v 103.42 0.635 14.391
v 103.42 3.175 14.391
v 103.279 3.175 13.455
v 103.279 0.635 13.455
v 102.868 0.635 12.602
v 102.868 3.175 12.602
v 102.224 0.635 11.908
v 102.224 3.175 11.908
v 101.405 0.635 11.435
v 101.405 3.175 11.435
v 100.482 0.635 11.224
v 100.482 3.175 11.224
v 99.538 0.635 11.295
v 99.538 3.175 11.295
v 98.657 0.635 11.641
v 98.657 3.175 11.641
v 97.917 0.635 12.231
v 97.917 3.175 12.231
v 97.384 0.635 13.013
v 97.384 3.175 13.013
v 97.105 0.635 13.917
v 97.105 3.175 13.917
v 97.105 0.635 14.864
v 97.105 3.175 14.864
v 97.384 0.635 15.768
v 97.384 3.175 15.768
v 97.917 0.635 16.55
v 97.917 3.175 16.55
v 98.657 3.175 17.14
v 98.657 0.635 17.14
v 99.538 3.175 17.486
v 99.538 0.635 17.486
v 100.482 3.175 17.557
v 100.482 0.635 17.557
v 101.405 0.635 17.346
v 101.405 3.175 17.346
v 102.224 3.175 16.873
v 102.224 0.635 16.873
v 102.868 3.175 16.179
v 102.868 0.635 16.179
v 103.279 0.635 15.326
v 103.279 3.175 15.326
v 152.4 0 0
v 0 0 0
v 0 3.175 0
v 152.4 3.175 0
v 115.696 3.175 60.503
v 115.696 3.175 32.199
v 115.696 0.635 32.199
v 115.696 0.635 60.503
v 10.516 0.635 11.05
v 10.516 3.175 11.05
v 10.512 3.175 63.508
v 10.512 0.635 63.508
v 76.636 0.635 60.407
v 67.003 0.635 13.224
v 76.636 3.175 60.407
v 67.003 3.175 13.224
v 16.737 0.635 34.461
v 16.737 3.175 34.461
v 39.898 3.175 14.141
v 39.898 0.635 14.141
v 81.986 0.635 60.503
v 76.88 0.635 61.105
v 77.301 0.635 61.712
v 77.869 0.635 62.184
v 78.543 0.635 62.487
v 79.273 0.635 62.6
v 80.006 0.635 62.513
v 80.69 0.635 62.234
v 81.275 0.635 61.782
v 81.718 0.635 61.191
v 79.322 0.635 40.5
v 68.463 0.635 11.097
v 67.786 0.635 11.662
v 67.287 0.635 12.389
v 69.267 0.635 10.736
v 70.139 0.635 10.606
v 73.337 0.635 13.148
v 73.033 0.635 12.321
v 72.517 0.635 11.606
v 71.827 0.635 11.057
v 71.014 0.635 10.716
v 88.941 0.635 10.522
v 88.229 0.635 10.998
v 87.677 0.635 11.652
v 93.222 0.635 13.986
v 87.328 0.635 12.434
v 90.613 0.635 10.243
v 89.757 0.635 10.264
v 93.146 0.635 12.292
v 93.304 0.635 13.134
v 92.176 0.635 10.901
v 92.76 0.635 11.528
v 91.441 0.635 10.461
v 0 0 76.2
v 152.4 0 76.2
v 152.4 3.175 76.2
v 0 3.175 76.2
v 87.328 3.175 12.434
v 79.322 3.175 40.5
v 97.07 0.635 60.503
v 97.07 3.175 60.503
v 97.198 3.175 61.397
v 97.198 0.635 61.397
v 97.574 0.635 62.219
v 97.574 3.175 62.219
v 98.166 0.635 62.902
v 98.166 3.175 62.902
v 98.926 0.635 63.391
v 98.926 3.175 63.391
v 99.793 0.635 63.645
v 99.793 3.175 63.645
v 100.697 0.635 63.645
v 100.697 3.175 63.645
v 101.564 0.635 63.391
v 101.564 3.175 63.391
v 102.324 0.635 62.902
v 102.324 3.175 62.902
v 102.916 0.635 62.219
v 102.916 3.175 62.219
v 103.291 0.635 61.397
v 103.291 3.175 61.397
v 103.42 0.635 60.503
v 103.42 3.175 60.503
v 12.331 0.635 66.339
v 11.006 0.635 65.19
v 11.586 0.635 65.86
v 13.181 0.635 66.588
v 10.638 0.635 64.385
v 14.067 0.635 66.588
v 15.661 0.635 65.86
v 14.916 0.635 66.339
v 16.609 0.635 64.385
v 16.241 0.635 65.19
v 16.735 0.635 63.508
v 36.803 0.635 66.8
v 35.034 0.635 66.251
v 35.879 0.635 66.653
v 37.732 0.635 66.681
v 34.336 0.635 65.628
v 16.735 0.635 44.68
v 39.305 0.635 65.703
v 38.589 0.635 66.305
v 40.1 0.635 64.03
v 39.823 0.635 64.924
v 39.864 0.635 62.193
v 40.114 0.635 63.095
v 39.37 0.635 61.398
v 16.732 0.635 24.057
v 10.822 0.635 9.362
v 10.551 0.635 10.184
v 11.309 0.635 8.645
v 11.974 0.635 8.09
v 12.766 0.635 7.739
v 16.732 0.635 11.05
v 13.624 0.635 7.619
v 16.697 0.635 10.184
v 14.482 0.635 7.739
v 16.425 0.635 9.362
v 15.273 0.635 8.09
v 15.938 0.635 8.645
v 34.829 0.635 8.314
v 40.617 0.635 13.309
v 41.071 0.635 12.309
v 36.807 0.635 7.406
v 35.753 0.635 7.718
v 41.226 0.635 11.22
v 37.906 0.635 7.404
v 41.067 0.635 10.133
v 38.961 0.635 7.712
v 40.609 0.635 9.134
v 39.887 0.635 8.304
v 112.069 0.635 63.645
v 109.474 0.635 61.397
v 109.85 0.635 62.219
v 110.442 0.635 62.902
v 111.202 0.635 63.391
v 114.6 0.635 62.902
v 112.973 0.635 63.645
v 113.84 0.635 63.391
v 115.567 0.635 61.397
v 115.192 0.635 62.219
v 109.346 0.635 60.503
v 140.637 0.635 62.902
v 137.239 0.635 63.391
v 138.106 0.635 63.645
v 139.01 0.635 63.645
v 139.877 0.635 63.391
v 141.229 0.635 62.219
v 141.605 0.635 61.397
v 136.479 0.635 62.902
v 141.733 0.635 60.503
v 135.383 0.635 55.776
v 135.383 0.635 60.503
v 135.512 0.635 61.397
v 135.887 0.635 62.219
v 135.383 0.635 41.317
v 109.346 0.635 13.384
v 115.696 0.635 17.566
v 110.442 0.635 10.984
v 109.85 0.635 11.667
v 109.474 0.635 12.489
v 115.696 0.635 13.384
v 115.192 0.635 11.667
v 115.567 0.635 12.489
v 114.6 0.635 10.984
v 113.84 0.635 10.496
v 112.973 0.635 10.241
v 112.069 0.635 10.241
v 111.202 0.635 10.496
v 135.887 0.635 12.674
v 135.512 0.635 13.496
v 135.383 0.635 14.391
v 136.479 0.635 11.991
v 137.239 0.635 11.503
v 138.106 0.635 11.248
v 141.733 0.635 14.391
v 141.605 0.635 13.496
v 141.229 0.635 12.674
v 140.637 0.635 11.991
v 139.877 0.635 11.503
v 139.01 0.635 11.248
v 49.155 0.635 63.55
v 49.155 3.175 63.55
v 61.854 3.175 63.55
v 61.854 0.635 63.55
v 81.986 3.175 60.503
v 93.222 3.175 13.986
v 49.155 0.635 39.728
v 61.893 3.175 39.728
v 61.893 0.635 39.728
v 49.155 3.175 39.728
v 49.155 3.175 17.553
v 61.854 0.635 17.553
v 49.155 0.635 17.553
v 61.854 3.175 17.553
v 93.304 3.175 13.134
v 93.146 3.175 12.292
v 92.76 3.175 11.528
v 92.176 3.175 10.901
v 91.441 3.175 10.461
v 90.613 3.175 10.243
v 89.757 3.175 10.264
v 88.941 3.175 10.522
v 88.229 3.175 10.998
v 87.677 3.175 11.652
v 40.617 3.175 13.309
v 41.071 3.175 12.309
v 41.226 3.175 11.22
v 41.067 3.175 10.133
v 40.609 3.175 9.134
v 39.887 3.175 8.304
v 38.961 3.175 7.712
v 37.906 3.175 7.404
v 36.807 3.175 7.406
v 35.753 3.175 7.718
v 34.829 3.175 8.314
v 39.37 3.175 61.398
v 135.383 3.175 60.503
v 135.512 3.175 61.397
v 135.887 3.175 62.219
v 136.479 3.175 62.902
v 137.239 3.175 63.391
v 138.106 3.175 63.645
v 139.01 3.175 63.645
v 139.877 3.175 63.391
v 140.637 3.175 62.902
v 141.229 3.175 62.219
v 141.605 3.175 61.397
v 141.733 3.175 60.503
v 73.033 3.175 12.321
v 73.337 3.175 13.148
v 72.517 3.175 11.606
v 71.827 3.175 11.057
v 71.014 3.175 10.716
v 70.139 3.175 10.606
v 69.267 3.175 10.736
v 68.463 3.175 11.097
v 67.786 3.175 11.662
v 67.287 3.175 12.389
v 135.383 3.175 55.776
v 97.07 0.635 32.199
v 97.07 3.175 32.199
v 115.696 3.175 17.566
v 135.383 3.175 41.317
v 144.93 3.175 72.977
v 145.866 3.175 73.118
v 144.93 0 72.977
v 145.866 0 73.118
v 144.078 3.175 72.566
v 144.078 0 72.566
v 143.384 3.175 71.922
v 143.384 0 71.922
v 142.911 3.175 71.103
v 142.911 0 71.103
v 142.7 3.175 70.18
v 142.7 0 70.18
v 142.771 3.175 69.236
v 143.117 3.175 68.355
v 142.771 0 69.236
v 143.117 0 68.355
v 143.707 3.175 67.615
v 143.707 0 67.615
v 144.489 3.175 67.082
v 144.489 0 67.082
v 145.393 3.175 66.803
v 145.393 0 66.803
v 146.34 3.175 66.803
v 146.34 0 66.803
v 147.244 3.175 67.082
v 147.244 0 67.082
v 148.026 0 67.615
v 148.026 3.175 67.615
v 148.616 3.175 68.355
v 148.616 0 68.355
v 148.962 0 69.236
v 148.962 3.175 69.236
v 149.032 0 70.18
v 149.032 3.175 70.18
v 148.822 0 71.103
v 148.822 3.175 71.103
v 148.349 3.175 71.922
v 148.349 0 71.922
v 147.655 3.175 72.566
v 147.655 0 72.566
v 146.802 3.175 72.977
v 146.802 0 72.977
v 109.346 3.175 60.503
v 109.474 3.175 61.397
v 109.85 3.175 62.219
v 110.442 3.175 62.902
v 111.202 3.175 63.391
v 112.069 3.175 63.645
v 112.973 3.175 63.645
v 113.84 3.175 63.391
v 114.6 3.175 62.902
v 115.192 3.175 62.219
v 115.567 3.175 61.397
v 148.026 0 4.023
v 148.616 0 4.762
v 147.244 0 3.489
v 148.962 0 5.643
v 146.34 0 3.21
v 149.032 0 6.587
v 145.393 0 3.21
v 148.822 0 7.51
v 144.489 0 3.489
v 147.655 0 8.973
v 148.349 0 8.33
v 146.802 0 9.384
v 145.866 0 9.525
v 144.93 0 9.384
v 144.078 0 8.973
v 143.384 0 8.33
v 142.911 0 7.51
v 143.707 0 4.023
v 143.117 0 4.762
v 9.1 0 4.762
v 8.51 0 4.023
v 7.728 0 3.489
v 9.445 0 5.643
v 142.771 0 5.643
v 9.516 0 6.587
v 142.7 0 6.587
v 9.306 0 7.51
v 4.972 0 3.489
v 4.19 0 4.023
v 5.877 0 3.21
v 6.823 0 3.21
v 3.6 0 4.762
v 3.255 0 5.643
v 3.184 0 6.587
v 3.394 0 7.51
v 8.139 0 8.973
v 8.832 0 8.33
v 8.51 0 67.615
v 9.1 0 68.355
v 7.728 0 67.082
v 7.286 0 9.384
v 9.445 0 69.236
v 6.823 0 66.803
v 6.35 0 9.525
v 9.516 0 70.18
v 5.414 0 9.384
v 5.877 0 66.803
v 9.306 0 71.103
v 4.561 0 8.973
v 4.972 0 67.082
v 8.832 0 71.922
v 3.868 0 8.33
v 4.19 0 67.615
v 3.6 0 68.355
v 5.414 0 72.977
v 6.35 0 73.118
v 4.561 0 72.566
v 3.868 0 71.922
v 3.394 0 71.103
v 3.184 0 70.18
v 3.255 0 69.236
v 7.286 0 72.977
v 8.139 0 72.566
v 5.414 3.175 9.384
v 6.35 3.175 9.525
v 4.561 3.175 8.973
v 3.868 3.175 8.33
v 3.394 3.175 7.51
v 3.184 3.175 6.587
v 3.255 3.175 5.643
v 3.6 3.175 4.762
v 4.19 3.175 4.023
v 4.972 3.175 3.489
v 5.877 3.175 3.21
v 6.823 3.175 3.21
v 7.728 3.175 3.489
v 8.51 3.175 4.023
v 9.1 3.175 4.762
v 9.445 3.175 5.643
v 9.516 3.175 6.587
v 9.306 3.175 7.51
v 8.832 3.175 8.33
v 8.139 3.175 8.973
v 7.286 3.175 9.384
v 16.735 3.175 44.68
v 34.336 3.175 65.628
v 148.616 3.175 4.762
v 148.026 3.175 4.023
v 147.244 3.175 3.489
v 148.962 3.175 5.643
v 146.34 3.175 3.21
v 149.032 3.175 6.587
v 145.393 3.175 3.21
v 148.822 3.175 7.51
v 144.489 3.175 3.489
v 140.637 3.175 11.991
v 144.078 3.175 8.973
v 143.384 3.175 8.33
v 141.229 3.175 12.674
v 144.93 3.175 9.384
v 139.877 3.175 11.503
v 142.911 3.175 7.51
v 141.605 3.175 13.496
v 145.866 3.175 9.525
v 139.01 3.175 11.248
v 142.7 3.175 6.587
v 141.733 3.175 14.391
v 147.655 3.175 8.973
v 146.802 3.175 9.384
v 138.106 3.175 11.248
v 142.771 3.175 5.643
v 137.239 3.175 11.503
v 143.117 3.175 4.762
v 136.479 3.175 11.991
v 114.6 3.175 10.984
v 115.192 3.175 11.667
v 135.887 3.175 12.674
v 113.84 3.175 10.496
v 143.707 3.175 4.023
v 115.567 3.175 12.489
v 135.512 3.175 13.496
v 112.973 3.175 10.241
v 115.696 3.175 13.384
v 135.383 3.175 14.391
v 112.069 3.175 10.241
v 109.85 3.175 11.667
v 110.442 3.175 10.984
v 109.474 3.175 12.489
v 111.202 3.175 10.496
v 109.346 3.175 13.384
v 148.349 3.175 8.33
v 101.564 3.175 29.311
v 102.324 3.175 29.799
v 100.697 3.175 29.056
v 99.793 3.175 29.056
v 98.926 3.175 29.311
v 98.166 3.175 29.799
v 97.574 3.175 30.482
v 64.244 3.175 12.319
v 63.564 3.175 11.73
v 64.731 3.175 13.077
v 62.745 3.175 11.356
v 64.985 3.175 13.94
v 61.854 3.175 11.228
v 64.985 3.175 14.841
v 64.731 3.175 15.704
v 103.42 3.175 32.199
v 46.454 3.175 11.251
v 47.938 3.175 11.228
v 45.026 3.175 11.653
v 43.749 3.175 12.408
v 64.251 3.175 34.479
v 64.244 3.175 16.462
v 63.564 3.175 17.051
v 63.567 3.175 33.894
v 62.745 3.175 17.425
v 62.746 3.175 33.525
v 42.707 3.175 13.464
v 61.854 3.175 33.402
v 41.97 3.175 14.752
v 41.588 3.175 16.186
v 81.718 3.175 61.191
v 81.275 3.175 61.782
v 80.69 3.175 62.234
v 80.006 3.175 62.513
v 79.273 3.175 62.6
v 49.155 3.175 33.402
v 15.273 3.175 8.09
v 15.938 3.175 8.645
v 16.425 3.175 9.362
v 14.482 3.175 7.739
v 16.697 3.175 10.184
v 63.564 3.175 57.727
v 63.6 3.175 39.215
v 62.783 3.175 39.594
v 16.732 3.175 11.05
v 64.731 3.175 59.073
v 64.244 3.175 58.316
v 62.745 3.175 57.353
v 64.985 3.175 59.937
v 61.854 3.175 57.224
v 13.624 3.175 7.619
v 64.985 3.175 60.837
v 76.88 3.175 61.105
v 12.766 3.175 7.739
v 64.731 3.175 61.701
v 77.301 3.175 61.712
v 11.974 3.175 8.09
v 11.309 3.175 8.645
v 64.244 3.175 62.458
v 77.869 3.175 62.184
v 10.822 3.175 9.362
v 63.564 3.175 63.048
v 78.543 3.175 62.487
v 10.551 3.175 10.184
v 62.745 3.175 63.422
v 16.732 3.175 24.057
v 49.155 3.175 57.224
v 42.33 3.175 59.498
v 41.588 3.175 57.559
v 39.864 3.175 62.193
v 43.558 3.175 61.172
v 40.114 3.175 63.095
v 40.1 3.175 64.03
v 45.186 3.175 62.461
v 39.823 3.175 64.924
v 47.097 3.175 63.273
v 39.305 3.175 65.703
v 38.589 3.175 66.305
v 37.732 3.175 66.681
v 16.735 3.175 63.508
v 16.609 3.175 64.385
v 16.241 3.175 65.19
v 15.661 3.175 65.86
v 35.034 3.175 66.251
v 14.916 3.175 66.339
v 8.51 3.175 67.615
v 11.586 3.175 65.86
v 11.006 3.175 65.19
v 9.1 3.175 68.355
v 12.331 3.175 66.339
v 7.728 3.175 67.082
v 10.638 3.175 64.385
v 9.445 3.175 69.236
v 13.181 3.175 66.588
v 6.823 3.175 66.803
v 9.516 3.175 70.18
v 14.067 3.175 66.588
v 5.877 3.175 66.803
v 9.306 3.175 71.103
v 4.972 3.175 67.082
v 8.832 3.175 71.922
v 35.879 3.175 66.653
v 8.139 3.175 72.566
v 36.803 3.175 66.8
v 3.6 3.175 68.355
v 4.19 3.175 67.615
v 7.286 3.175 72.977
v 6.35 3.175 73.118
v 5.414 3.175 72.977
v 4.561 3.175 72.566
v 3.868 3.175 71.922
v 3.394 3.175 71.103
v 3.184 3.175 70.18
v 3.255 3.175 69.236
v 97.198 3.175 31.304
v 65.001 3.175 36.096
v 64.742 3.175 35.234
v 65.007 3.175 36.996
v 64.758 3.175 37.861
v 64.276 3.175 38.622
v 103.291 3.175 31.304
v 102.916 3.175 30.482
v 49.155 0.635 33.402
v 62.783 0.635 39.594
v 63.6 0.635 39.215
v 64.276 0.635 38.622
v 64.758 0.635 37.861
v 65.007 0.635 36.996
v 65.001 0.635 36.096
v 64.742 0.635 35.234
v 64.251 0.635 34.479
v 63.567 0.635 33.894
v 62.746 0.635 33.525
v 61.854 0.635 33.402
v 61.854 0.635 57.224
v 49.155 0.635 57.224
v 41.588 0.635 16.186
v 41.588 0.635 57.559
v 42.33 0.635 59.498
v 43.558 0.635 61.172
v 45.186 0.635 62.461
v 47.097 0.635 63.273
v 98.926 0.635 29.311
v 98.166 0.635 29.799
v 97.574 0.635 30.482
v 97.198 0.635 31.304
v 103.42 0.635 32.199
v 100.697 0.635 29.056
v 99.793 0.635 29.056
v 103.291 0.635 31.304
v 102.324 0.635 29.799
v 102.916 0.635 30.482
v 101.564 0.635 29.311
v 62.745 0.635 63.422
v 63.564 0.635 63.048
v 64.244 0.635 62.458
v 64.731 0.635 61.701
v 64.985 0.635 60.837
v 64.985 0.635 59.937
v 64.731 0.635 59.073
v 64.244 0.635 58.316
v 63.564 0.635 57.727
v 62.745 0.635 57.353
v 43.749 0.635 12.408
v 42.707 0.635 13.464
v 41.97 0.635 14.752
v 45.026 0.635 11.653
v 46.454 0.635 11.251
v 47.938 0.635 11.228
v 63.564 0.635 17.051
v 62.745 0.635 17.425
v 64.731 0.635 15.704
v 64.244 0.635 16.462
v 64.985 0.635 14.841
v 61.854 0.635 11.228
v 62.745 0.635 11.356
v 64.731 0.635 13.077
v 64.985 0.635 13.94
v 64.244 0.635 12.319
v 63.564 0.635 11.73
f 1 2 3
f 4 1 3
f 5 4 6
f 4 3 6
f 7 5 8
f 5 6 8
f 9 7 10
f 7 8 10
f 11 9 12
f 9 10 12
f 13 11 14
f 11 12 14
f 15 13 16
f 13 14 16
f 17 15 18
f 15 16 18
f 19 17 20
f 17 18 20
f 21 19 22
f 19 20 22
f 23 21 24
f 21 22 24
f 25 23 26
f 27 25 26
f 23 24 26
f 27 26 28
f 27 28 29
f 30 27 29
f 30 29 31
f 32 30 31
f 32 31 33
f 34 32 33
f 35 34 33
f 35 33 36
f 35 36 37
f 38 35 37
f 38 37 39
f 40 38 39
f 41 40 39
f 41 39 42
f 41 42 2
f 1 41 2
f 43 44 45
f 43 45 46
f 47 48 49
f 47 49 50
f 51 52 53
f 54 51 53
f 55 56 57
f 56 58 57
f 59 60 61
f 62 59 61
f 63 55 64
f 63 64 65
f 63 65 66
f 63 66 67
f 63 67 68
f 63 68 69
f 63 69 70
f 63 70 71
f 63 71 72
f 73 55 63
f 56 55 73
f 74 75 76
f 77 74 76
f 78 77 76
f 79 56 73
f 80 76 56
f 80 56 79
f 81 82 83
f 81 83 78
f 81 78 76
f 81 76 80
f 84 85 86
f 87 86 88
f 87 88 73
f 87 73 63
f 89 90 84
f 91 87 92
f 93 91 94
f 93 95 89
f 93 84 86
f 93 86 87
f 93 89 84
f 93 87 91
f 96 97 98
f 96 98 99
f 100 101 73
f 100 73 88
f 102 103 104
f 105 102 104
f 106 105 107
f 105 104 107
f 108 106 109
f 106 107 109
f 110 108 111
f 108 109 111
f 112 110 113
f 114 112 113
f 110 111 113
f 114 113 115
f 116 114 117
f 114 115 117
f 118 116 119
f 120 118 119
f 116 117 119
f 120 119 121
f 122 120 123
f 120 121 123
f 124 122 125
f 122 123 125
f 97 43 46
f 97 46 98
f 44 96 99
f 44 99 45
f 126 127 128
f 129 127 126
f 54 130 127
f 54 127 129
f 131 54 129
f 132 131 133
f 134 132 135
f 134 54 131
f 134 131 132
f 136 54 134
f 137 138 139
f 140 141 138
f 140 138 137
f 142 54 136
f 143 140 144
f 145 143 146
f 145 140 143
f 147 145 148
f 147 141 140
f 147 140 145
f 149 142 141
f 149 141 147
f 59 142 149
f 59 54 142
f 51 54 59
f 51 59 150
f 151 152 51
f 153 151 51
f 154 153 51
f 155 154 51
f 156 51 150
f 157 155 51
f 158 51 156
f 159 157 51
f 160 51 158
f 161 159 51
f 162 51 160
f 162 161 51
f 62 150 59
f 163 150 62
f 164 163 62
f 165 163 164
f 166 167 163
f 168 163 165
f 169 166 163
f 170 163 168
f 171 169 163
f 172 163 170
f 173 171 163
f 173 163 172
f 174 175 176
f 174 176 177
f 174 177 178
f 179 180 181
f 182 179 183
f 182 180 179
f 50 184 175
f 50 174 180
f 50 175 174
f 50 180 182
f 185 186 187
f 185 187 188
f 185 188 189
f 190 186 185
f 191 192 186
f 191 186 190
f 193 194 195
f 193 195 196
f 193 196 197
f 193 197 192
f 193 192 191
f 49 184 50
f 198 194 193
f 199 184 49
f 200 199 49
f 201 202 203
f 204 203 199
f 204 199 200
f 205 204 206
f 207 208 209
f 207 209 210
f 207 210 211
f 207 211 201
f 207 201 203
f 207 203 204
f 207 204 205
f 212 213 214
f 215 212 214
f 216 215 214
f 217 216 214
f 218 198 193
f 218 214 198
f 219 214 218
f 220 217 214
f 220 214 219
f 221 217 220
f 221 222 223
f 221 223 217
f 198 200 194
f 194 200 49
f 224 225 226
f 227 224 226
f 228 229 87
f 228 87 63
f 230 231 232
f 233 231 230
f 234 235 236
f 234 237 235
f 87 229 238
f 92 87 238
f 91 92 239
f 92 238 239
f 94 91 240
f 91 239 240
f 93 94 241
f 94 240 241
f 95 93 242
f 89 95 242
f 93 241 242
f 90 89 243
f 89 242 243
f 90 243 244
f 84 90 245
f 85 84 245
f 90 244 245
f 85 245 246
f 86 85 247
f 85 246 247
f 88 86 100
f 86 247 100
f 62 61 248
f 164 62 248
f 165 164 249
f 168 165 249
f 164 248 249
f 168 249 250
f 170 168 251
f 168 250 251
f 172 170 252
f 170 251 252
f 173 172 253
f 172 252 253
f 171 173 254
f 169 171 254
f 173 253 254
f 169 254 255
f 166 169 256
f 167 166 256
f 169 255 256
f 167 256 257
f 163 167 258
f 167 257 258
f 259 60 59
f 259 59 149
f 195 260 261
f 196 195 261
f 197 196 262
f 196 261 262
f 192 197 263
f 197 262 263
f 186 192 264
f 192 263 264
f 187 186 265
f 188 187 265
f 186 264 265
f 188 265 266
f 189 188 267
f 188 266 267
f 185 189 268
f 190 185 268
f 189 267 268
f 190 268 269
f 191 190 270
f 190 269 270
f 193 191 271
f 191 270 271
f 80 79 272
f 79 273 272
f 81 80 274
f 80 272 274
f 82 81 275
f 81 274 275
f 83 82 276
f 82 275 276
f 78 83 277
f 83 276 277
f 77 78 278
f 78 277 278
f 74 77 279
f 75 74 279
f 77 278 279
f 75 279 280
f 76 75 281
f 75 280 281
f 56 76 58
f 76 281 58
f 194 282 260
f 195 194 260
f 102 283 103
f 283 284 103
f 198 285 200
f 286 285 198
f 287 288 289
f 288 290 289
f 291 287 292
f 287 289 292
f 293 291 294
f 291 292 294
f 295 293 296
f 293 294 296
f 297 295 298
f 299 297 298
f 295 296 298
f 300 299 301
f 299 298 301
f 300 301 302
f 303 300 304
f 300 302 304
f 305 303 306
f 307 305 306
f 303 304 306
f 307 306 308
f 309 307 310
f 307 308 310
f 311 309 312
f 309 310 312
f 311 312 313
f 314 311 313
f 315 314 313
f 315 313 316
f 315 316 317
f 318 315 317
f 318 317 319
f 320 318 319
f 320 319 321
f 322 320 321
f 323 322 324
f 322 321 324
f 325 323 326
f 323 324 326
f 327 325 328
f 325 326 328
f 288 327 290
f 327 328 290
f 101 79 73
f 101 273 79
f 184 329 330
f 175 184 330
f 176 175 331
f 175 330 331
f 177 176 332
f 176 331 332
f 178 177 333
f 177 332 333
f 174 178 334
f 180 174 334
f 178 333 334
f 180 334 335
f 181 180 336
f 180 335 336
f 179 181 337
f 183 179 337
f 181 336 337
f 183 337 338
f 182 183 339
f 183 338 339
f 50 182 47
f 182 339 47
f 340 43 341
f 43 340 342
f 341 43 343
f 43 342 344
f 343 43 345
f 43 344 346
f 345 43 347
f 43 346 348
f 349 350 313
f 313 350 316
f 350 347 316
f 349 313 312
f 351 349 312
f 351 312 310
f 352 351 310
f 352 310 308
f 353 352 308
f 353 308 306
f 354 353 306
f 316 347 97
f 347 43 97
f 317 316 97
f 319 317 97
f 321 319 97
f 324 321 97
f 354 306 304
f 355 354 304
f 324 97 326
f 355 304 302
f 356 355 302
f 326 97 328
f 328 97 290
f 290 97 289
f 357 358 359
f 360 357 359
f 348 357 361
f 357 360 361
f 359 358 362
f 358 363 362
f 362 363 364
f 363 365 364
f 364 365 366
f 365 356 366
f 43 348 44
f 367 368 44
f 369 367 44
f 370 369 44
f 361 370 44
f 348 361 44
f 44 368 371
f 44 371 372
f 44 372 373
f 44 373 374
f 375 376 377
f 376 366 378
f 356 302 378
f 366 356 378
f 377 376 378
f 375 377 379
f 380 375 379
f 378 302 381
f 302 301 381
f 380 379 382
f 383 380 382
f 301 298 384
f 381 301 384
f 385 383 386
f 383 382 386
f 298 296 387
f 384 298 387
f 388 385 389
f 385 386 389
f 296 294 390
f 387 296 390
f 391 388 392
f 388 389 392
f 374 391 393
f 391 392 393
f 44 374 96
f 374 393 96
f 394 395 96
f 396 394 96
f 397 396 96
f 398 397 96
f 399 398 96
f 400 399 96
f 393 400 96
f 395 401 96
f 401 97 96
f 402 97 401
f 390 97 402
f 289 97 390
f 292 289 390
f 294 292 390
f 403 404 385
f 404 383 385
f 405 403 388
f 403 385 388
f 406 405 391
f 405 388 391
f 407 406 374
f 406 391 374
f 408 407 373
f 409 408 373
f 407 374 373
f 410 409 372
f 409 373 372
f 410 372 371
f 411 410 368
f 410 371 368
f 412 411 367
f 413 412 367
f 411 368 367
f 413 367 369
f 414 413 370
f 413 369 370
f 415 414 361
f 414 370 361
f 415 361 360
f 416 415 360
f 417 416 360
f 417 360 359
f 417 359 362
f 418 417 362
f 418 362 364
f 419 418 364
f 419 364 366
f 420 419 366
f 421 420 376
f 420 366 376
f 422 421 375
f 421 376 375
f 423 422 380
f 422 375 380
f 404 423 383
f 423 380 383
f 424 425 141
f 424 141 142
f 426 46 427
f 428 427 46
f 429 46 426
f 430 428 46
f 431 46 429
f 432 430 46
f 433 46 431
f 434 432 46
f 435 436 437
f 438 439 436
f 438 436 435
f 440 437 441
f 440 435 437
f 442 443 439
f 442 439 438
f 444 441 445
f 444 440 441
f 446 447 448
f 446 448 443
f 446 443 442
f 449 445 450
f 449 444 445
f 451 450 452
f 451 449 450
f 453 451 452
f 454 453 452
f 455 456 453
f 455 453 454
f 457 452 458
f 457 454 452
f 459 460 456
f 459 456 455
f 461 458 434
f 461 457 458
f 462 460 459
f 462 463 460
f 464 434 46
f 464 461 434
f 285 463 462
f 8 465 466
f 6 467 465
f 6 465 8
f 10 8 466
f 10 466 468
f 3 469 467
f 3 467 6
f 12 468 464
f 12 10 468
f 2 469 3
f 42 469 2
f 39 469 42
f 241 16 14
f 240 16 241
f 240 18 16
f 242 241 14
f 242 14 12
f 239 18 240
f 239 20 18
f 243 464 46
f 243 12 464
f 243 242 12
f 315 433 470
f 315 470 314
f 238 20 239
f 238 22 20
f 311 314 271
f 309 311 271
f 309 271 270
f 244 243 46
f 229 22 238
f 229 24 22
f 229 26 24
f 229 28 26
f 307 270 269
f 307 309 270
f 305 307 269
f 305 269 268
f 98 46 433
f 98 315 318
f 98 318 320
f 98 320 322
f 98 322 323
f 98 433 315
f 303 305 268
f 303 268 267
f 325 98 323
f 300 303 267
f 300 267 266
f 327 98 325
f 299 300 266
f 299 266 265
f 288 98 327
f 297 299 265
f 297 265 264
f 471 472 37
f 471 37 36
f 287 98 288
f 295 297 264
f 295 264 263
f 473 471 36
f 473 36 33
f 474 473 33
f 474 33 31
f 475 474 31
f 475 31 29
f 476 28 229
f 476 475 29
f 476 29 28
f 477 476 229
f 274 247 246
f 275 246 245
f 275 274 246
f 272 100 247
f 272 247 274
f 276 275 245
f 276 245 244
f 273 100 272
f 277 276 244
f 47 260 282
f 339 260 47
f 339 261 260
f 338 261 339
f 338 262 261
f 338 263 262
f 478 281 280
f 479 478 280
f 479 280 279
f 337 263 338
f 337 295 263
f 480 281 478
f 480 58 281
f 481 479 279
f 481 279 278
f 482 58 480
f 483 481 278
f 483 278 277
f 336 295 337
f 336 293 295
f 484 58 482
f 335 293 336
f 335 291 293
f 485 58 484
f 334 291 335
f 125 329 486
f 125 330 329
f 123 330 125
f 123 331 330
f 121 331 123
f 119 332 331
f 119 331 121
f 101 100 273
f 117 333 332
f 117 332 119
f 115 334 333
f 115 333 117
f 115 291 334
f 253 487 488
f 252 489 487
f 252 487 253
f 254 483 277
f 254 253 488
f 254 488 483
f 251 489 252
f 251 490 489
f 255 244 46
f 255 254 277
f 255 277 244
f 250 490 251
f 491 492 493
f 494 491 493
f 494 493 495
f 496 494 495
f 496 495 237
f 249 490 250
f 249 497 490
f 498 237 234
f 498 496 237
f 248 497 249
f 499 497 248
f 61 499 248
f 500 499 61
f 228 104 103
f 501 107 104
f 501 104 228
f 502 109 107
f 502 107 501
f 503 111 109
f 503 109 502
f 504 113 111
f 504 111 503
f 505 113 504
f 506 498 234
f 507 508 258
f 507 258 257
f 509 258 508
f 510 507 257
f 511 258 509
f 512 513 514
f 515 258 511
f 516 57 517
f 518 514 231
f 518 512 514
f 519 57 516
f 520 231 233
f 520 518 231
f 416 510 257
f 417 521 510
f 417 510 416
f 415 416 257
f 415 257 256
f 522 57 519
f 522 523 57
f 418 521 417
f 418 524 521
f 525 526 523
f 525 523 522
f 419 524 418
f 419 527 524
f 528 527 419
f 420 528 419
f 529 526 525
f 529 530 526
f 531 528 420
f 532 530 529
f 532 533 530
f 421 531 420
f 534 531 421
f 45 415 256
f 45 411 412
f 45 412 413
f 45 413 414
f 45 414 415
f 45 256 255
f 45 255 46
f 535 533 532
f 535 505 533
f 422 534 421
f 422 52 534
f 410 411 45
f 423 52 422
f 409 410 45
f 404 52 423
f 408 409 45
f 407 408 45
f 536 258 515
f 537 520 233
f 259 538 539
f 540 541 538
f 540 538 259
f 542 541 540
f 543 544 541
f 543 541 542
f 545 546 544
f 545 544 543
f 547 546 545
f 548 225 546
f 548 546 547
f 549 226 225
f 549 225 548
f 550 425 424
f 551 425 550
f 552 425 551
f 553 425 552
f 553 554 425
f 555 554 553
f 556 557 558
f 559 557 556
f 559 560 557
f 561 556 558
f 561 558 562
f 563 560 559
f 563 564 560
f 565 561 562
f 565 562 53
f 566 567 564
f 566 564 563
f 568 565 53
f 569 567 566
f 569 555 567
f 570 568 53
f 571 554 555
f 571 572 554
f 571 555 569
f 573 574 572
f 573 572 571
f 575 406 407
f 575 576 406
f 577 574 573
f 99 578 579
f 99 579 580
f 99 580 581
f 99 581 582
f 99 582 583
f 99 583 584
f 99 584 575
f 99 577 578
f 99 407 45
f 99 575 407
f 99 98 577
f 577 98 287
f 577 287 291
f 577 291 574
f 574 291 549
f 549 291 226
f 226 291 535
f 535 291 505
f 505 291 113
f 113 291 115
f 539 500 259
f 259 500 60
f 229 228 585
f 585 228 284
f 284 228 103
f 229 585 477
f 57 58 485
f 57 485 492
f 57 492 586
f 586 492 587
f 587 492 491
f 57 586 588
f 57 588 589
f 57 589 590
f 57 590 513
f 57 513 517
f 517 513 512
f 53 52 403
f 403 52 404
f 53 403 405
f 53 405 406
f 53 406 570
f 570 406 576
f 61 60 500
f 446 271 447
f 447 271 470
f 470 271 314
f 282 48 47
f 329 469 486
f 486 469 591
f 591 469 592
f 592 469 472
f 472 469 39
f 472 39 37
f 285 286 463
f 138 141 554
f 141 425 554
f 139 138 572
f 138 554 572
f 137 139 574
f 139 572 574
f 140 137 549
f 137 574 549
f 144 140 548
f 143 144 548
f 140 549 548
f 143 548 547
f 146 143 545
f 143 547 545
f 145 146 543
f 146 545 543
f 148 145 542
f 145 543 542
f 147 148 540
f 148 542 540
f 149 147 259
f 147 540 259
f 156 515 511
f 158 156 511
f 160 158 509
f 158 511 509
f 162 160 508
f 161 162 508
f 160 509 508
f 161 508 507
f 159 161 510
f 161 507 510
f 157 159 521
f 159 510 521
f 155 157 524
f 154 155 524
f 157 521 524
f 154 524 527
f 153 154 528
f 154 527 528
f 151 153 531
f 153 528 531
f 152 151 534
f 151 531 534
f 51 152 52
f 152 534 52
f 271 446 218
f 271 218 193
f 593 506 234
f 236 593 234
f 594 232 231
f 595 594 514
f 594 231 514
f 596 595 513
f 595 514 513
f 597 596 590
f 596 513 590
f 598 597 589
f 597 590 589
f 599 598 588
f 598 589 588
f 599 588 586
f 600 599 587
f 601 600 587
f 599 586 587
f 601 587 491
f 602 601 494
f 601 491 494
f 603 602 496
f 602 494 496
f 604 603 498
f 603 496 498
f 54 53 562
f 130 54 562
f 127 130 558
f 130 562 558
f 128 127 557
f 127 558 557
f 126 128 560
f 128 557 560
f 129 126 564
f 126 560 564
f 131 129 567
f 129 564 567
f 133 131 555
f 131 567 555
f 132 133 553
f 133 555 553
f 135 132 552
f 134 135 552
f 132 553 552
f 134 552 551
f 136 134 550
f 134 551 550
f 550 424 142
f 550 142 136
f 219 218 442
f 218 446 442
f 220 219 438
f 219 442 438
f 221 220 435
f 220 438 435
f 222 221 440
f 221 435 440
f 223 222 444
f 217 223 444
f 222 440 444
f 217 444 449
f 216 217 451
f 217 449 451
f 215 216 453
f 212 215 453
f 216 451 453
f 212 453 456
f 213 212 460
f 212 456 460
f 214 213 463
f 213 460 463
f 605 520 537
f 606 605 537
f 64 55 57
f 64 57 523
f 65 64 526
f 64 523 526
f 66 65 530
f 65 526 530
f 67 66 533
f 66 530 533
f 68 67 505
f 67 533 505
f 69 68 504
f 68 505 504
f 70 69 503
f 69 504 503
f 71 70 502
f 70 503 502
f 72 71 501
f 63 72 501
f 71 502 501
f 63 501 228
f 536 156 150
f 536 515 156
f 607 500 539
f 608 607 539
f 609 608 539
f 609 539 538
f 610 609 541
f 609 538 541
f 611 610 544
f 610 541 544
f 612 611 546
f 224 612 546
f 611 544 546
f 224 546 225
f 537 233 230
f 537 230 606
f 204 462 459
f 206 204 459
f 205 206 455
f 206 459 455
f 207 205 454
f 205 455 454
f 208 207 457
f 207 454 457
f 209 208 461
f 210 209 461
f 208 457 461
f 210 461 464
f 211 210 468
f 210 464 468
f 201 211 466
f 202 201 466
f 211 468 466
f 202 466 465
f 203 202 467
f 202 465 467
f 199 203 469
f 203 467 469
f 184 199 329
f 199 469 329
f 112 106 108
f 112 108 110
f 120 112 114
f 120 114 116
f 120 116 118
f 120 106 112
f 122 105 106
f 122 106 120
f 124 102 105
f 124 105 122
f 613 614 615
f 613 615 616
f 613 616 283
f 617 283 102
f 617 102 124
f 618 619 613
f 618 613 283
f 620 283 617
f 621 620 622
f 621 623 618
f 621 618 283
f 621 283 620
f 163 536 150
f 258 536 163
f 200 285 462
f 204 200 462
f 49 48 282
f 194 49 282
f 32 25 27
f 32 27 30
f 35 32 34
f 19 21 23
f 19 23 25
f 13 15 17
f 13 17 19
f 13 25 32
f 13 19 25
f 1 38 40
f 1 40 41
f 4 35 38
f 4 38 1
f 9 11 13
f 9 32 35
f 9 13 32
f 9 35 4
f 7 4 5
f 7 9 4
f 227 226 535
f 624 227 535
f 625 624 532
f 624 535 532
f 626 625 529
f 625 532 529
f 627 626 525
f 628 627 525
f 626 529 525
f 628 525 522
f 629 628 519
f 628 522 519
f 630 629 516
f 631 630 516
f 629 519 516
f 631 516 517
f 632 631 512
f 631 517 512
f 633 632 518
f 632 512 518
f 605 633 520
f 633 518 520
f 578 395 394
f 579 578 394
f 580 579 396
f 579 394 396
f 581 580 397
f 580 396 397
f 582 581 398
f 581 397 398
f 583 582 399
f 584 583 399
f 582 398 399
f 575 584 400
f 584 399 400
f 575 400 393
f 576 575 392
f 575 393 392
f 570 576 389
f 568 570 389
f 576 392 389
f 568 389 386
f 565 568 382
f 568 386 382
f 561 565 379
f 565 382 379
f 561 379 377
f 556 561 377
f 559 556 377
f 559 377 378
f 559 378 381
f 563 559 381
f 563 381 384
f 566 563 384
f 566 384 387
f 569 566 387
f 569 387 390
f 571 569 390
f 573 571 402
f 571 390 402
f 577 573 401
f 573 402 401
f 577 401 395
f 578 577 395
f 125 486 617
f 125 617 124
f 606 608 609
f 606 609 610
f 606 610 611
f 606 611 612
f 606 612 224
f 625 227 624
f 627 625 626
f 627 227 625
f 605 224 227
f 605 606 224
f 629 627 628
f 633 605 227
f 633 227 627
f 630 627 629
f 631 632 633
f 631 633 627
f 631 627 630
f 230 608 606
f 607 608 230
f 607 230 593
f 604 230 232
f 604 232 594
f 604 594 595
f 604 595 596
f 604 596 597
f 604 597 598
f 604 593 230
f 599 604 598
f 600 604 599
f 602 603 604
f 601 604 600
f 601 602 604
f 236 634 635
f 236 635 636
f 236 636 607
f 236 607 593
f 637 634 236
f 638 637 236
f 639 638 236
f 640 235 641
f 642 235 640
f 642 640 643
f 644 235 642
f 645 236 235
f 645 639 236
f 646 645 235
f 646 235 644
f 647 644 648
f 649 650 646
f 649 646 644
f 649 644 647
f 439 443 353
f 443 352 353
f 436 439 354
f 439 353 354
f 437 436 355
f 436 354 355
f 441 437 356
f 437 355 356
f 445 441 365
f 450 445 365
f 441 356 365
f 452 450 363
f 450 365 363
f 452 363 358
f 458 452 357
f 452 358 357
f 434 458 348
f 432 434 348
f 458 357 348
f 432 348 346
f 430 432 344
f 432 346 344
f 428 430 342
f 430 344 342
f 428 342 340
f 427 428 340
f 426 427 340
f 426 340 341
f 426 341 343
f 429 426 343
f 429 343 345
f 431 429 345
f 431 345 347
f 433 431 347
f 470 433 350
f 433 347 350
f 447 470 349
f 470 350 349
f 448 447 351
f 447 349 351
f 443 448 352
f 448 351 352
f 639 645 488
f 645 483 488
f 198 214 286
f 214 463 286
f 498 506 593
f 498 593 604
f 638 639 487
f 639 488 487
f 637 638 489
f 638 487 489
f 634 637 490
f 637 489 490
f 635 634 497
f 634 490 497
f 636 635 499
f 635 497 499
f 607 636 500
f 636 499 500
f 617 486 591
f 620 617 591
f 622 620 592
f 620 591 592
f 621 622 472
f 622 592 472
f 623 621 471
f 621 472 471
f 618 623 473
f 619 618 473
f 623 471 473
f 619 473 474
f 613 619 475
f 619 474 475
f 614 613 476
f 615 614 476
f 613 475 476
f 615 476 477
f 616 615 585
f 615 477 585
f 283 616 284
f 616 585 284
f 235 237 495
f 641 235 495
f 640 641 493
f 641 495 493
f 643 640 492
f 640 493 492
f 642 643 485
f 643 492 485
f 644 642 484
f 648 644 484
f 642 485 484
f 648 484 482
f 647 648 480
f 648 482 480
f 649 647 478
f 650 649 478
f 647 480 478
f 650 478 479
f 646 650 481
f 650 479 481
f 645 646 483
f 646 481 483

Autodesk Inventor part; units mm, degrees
ref_plane "YZ Plane" through (0, 0, 0) normal (1, 0, 0) x (0, 1, 0)
ref_plane "XZ Plane" through (0, 0, 0) normal (0, 1, 0) x (-1, 0, 0)
ref_plane "XY Plane" through (0, 0, 0) normal (0, 0, 1) x (1, 0, 0)
sketch "Sketch1" plane through (0, 0, 0) normal (0, 1, 0) x (-1, 0, 0)
  line L0 (0, 0) -> (-152.4, 0)
  line L1 (-152.4, 0) -> (-152.4, 76.2)
  line L2 (-152.4, 76.2) -> (0, 76.2)
  line L3 (0, 76.2) -> (0, 0)
extrude "Extrusion1" add sketch "Sketch1" along normal blind 3.175
sketch "Sketch2" plane through (0, 3.175, 0) normal (0, 1, 0) x (1, 0, 0)
  point P0 (0, 0)
sketch "Sketch3" plane through (0, 3.175, 0) normal (0, 1, 0) x (1, 0, 0)
  point P0 (0, 0)
sketch "Sketch4" plane through (0, 3.175, 0) normal (0, 1, 0) x (1, 0, 0)
  circle A0 centre (6.35, -6.35) radius 3.175
  circle A1 centre (6.35, -69.9426) radius 3.175
  circle A2 centre (145.8663, -69.9426) radius 3.175
  circle A3 centre (145.8663, -6.35) radius 3.175
  point P0 (0, 0)
hole "Hole1" at (6.35, 3.175, 6.35) at (6.35, 3.175, 69.9426) at (145.8663, 3.175, 69.9426) at (145.8663, 3.175, 6.35) direction (0, -1, 0) diameter 6.35 end through all
sketch "Sketch5" plane through (0, 3.175, 0) normal (0, 1, 0) x (1, 0, 0)
  line L0 (10.5157, -11.0499) -> (10.5124, -63.5081)
  arc A0 (16.7318, -11.0499) -> (10.5157, -11.0499) centre (13.6238, -10.7421) ccw
  arc A1 (10.5124, -63.5081) -> (16.7351, -63.5081) centre (13.6238, -63.5083) ccw
  line L1 (16.7318, -24.057) -> (34.8293, -8.3141)
  line L2 (16.7369, -34.4606) -> (39.8985, -14.1414)
  line L3 (16.7369, -34.4606) -> (39.3705, -61.398)
  line L4 (34.3364, -65.6278) -> (16.7351, -44.6796)
  line L5 (16.7318, -11.0499) -> (16.7318, -24.057)
  line L6 (16.7351, -44.6796) -> (16.7351, -63.5081)
  arc A2 (39.8985, -14.1414) -> (34.8293, -8.3141) centre (37.3639, -11.2278) ccw
  arc A3 (34.3364, -65.6278) -> (39.3705, -61.398) centre (36.8535, -63.5129) ccw
  arc A4 (61.8542, -17.5534) -> (61.8542, -11.2278) centre (61.8542, -14.3906) ccw
  arc A5 (61.8927, -39.7278) -> (61.8542, -33.4021) centre (61.8734, -36.5649) ccw
  arc A6 (61.8542, -63.5501) -> (61.8542, -57.2244) centre (61.8542, -60.3873) ccw
  line L7 (61.8542, -11.2278) -> (47.9378, -11.2278)
  line L8 (49.1549, -33.4021) -> (49.1549, -17.5534)
  line L9 (49.1549, -39.7278) -> (49.1549, -57.2244)
  line L10 (61.8542, -57.2244) -> (49.1549, -57.2244)
  line L11 (61.8927, -39.7278) -> (49.1549, -39.7278)
  line L12 (61.8542, -17.5534) -> (49.1549, -17.5534)
  line L13 (49.1549, -33.4021) -> (61.8542, -33.4021)
  arc A7 (47.9378, -11.2278) -> (41.5878, -16.1855) centre (47.2856, -16.9379) ccw
  line L14 (41.5878, -16.1855) -> (41.5878, -57.5593)
  line L15 (49.1549, -63.5501) -> (61.8542, -63.5501)
  arc A8 (41.5878, -57.5593) -> (49.1549, -63.5501) centre (49.1549, -55.7757) ccw
  line L16 (67.0028, -13.2236) -> (76.6357, -60.4074)
  line L17 (93.2217, -13.986) -> (81.9862, -60.5027)
  line L18 (73.3373, -13.1484) -> (79.3224, -40.4995)
  line L19 (79.3224, -40.4995) -> (87.3283, -12.4343)
  arc A9 (73.3373, -13.1484) -> (67.0028, -13.2236) centre (70.1778, -13.8398) ccw
  arc A10 (93.2217, -13.986) -> (87.3283, -12.4343) centre (90.2592, -13.2704) ccw
  arc A11 (76.6357, -60.4074) -> (81.9862, -60.5027) centre (79.3216, -59.8591) ccw
  circle A12 centre (100.2447, -14.3906) radius 3.175
  line L20 (97.0697, -32.199) -> (97.0697, -60.5027)
  line L21 (103.4197, -32.199) -> (103.4197, -60.5027)
  arc A13 (97.0697, -60.5027) -> (103.4197, -60.5027) centre (100.2447, -60.5027) ccw
  arc A14 (103.4197, -32.199) -> (97.0697, -32.199) centre (100.2447, -32.199) ccw
  line L22 (109.3457, -13.3836) -> (109.3457, -60.5027)
  line L23 (141.7333, -14.3906) -> (141.7333, -60.5027)
  arc A15 (109.3457, -60.5027) -> (115.6957, -60.5027) centre (112.5207, -60.5027) ccw
  arc A16 (115.6957, -13.3836) -> (109.3457, -13.3836) centre (112.5207, -13.3836) ccw
  arc A17 (141.7333, -14.3906) -> (135.3833, -14.3906) centre (138.5583, -14.3906) ccw
  arc A18 (135.3833, -60.5027) -> (141.7333, -60.5027) centre (138.5583, -60.5027) ccw
  line L24 (115.6957, -17.5656) -> (135.3833, -41.317)
  line L25 (115.6957, -32.199) -> (135.3833, -55.7757)
  line L26 (135.3833, -14.3906) -> (135.3833, -41.317)
  line L27 (135.3833, -55.7757) -> (135.3833, -60.5027)
  line L28 (115.6957, -32.199) -> (115.6957, -60.5027)
  line L29 (115.6957, -17.5656) -> (115.6957, -13.3836)
  point P0 (0, 0)
sketch "Sketch6" plane through (0, 3.175, 0) normal (0, 1, 0) x (1, 0, 0)
  point P0 (0, 0)
extrude "Extrusion2" cut sketch "Sketch5" against normal blind 2.54
properties part number "klam final"
